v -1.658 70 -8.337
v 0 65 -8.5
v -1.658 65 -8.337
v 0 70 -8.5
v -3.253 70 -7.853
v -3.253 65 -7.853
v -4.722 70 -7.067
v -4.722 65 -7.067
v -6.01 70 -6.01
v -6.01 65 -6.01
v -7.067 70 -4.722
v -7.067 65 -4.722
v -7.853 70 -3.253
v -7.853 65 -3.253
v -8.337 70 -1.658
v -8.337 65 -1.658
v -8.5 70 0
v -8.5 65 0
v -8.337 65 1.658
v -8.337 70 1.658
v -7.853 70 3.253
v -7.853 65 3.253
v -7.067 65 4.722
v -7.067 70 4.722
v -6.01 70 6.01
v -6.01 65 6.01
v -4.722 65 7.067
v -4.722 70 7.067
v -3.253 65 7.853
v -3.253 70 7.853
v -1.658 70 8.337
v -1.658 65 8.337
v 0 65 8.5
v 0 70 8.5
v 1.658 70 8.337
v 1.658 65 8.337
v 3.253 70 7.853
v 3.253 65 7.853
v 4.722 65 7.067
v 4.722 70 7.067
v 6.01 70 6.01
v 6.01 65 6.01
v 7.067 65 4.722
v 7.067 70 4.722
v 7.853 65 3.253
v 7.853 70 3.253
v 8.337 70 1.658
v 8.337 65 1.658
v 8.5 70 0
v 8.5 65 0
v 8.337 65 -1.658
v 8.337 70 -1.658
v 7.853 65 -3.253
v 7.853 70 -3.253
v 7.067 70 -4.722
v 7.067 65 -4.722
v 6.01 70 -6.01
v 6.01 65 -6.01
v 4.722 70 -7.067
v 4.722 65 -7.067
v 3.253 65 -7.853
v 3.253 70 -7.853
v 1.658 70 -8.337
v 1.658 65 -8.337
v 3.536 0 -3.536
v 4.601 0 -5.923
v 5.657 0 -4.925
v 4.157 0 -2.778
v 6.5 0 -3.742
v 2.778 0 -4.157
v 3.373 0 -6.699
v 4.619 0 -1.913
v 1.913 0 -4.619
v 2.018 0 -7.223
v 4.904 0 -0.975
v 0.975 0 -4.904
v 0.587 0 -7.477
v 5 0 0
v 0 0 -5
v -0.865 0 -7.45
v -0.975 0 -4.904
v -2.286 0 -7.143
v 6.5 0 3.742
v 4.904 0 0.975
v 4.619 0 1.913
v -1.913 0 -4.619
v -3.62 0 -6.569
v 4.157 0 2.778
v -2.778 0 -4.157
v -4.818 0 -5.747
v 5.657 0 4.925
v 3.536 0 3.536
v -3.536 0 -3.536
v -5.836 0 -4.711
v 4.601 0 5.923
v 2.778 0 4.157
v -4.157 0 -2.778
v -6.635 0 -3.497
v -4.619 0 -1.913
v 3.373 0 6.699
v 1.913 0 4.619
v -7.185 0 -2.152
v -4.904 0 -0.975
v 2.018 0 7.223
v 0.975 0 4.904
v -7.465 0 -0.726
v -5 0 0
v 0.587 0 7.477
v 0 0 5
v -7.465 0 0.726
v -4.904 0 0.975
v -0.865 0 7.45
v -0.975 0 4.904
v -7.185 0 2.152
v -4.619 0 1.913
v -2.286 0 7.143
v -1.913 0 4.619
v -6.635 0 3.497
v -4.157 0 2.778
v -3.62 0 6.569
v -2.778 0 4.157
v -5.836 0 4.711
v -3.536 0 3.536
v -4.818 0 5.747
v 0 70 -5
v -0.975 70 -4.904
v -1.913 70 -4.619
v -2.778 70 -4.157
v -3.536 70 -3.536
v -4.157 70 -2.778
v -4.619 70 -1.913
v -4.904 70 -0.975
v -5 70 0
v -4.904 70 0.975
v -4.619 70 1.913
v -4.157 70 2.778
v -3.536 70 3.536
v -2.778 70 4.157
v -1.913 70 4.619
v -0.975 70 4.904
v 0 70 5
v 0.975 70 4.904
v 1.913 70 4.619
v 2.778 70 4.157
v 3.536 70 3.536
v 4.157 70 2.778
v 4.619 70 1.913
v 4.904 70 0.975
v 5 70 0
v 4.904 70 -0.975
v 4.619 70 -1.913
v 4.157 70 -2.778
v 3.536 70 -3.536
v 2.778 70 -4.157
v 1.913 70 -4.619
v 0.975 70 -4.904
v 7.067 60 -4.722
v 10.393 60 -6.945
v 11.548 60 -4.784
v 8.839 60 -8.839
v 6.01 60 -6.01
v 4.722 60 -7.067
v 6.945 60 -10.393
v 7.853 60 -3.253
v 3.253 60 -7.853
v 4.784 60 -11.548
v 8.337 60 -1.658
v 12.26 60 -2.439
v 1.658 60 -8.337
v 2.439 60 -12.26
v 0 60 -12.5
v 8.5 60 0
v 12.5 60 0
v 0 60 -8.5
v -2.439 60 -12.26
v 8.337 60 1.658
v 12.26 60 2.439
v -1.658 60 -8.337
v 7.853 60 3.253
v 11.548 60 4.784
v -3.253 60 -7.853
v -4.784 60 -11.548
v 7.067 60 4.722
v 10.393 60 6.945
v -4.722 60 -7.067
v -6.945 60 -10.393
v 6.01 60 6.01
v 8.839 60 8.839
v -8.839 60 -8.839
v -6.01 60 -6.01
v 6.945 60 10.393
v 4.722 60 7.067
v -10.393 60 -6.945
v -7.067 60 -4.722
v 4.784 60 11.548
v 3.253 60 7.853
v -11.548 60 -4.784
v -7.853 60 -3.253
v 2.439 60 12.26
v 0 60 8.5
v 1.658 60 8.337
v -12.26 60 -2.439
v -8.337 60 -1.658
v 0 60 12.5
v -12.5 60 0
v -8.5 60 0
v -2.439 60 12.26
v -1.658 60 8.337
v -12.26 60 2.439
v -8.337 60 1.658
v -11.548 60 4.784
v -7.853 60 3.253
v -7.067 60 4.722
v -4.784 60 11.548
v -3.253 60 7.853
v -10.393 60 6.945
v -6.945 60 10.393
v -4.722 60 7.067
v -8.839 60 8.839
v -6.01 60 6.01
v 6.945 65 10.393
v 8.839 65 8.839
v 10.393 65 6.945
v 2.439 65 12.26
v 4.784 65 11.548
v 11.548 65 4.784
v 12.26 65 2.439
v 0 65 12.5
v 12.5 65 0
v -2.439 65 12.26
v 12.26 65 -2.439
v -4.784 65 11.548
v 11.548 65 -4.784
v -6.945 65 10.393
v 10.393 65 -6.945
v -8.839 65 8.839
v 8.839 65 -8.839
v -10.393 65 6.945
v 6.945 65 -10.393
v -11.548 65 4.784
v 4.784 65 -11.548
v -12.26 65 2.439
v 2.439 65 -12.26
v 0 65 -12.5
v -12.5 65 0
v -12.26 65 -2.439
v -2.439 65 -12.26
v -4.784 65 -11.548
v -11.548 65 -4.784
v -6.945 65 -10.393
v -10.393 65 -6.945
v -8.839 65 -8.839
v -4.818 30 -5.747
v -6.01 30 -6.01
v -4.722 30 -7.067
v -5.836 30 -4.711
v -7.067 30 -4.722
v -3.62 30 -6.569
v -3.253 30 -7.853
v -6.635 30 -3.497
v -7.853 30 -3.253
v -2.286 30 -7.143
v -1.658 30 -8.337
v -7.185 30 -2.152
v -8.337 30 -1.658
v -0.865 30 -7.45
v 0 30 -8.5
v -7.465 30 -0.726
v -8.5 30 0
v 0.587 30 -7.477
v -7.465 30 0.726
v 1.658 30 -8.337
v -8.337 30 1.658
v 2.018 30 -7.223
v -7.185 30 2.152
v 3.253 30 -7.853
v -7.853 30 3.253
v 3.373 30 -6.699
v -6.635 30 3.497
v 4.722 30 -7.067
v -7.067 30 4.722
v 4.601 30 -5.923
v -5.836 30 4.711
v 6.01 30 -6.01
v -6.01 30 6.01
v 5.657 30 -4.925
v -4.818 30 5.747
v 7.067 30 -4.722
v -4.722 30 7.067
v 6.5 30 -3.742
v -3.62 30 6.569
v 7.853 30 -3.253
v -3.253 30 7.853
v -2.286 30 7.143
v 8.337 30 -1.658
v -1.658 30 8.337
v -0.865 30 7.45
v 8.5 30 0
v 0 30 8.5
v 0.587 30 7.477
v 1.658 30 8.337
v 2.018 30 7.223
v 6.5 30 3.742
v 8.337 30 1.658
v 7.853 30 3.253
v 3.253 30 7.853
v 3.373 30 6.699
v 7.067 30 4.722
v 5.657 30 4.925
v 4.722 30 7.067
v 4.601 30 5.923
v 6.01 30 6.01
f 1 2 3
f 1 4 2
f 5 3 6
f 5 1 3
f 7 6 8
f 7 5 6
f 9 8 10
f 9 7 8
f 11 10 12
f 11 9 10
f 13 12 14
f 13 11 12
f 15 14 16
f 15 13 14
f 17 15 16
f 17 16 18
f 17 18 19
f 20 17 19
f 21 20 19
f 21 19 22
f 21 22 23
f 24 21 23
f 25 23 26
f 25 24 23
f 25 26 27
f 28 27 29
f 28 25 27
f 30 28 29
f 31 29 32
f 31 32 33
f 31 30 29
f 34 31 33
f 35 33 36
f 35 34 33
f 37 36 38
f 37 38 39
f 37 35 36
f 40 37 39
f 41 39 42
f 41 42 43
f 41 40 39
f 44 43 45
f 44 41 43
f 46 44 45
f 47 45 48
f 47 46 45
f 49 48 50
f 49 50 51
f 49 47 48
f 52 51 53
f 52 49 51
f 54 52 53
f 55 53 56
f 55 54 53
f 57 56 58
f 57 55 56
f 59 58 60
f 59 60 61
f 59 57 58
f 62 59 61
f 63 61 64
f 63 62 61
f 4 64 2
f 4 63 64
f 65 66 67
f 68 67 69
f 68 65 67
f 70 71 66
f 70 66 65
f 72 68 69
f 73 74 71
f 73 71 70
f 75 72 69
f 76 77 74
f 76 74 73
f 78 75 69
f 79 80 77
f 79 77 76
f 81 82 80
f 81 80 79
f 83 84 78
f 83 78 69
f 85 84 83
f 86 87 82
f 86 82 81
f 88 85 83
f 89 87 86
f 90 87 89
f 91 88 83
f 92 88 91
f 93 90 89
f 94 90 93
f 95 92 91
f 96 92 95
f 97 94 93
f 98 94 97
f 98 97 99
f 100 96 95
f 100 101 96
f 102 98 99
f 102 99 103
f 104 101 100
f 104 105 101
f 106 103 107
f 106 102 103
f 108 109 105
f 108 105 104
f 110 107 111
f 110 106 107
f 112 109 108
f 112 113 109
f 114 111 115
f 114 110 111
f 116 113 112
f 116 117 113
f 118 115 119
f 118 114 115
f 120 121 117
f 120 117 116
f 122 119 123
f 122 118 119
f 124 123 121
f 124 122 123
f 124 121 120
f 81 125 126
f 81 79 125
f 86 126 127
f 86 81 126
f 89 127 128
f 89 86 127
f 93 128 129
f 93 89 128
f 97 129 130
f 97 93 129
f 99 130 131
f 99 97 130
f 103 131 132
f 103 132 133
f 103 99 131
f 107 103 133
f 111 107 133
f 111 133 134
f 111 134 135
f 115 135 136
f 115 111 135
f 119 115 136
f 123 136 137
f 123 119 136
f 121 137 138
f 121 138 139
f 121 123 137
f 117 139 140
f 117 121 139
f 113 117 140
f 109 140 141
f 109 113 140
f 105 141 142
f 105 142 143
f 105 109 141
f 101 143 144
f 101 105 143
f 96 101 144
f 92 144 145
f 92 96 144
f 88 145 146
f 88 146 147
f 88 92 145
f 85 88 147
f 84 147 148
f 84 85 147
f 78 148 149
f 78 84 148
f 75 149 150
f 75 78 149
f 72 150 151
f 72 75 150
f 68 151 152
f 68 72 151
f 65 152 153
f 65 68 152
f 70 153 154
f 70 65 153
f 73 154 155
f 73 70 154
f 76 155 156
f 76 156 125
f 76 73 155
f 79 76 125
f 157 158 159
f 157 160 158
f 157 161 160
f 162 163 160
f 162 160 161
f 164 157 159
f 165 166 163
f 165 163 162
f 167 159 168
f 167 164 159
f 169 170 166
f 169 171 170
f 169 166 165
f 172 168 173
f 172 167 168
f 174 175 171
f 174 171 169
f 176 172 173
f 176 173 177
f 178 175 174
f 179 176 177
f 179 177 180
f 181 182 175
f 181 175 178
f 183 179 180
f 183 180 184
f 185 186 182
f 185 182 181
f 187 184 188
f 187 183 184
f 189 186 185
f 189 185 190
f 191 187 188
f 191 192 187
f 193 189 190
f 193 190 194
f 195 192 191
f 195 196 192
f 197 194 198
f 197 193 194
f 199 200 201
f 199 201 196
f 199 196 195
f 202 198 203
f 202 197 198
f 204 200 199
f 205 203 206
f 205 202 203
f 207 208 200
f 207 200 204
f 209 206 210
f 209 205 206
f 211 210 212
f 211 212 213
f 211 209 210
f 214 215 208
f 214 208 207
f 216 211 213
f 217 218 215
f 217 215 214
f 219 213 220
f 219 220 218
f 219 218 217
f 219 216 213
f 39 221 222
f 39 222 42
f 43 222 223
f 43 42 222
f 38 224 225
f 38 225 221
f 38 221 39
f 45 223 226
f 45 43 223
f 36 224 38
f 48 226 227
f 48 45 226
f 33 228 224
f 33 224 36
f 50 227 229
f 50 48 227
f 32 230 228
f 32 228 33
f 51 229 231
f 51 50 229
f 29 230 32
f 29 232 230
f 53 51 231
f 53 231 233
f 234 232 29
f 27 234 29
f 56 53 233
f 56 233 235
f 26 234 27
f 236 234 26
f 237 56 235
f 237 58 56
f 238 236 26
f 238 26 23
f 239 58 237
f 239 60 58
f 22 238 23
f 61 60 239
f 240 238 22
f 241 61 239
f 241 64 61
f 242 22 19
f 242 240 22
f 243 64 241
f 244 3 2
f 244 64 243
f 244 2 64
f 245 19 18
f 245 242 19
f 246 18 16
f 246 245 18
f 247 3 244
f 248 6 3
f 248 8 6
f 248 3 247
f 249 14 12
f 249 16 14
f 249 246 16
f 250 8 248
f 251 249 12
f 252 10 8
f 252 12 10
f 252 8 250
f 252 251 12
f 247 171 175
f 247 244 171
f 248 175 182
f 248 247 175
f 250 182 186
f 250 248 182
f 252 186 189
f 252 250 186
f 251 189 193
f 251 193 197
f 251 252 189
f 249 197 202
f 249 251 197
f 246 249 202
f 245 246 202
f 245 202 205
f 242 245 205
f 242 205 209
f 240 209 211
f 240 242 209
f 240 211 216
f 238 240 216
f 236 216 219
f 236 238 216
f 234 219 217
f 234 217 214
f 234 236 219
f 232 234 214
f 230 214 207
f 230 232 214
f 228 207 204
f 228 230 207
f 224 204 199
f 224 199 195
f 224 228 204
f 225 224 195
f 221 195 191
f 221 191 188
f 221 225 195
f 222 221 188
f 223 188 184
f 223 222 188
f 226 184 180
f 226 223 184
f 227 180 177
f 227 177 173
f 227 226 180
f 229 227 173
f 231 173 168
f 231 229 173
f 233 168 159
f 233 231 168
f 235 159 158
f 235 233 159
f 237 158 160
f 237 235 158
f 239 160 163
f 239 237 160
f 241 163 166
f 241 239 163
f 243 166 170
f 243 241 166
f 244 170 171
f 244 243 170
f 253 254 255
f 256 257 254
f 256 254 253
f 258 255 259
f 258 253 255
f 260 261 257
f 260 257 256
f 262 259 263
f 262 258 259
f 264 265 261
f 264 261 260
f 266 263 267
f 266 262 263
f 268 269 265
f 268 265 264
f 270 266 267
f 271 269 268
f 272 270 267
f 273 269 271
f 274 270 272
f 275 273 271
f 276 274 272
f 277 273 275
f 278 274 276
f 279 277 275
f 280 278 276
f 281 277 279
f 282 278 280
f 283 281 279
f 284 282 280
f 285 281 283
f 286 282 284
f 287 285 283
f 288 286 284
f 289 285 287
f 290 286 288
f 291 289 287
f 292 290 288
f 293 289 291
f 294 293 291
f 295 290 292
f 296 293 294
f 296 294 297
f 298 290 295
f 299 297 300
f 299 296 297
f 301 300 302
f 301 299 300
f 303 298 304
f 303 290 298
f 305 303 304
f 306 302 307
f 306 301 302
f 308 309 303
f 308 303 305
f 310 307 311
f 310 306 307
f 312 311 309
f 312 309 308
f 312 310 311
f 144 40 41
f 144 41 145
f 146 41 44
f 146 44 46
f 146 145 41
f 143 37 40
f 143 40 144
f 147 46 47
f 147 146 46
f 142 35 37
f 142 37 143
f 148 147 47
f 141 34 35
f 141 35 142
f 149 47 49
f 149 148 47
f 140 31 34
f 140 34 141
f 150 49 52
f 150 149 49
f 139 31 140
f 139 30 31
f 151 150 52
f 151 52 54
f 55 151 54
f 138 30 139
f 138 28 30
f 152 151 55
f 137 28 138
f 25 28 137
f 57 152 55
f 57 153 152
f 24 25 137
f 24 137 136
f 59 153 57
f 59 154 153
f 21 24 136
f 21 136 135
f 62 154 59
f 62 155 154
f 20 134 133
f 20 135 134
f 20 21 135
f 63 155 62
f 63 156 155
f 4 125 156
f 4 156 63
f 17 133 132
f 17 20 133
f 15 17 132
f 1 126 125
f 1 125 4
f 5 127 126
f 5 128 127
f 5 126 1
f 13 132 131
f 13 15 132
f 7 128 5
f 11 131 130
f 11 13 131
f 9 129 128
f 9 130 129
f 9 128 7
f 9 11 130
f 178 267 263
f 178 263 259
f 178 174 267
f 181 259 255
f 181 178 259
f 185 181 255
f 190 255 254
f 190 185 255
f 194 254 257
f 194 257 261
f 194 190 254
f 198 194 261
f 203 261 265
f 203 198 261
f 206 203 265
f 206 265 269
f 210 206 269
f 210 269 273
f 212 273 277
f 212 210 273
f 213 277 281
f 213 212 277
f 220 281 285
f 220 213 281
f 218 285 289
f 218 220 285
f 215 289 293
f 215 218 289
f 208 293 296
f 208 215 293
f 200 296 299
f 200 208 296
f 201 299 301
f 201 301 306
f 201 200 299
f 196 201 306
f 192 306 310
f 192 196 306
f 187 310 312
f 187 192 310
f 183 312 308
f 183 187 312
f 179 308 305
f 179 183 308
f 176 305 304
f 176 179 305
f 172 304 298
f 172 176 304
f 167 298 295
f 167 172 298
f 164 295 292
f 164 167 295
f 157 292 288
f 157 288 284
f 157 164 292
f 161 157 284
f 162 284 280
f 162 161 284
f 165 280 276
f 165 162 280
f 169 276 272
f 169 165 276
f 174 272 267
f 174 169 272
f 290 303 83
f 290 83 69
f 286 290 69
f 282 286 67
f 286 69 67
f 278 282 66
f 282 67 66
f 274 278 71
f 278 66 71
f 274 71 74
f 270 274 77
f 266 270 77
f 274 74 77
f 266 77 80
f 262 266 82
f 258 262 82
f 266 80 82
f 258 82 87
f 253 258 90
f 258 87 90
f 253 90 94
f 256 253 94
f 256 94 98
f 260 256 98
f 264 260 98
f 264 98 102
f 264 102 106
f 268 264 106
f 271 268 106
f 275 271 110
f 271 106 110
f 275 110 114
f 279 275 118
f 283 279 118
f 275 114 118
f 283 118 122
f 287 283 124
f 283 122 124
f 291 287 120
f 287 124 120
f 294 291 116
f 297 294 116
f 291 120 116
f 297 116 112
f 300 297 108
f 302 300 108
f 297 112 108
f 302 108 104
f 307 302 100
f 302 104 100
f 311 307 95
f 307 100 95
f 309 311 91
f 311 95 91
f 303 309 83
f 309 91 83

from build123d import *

# Parameters (mm, degrees)
SKETCH_2_OUTSIDE_W  = 42.684
SKETCH_2_OUTSIDE_H  = 42.684
CUT_EXTRUDE_1_DEPTH = 30


with BuildPart() as part:
    # Эскиз1 → Повернуть1 (revolve)
    with BuildSketch(Plane.XY, mode=Mode.PRIVATE) as revolve_1_sk:
        Polygon((5, 70), (5, 0), (8.5, 0), (8.5, 60), (12.5, 60), (12.5, 65), (8.5, 65), (8.5, 70), align=None)
    revolve(revolve_1_sk.sketch.rotate(Axis((0, 0, 0), (0, 1, 0)), 90), axis=Axis((0, 0, 0), (0, 1, 0)))

    # Эскиз2 outside → Вырез-Вытянуть1 (cut)
    with BuildSketch(Plane.XZ):
        Rectangle(SKETCH_2_OUTSIDE_W, SKETCH_2_OUTSIDE_H)
        with BuildLine():
            Line((6.5, 3.741657387), (6.5, -3.741657387))
            ThreePointArc((6.5, -3.741657387), (-7.5, 0), (6.5, 3.741657387))
        make_face(mode=Mode.SUBTRACT)
    extrude(amount=-CUT_EXTRUDE_1_DEPTH, mode=Mode.SUBTRACT)


solid = part.part
